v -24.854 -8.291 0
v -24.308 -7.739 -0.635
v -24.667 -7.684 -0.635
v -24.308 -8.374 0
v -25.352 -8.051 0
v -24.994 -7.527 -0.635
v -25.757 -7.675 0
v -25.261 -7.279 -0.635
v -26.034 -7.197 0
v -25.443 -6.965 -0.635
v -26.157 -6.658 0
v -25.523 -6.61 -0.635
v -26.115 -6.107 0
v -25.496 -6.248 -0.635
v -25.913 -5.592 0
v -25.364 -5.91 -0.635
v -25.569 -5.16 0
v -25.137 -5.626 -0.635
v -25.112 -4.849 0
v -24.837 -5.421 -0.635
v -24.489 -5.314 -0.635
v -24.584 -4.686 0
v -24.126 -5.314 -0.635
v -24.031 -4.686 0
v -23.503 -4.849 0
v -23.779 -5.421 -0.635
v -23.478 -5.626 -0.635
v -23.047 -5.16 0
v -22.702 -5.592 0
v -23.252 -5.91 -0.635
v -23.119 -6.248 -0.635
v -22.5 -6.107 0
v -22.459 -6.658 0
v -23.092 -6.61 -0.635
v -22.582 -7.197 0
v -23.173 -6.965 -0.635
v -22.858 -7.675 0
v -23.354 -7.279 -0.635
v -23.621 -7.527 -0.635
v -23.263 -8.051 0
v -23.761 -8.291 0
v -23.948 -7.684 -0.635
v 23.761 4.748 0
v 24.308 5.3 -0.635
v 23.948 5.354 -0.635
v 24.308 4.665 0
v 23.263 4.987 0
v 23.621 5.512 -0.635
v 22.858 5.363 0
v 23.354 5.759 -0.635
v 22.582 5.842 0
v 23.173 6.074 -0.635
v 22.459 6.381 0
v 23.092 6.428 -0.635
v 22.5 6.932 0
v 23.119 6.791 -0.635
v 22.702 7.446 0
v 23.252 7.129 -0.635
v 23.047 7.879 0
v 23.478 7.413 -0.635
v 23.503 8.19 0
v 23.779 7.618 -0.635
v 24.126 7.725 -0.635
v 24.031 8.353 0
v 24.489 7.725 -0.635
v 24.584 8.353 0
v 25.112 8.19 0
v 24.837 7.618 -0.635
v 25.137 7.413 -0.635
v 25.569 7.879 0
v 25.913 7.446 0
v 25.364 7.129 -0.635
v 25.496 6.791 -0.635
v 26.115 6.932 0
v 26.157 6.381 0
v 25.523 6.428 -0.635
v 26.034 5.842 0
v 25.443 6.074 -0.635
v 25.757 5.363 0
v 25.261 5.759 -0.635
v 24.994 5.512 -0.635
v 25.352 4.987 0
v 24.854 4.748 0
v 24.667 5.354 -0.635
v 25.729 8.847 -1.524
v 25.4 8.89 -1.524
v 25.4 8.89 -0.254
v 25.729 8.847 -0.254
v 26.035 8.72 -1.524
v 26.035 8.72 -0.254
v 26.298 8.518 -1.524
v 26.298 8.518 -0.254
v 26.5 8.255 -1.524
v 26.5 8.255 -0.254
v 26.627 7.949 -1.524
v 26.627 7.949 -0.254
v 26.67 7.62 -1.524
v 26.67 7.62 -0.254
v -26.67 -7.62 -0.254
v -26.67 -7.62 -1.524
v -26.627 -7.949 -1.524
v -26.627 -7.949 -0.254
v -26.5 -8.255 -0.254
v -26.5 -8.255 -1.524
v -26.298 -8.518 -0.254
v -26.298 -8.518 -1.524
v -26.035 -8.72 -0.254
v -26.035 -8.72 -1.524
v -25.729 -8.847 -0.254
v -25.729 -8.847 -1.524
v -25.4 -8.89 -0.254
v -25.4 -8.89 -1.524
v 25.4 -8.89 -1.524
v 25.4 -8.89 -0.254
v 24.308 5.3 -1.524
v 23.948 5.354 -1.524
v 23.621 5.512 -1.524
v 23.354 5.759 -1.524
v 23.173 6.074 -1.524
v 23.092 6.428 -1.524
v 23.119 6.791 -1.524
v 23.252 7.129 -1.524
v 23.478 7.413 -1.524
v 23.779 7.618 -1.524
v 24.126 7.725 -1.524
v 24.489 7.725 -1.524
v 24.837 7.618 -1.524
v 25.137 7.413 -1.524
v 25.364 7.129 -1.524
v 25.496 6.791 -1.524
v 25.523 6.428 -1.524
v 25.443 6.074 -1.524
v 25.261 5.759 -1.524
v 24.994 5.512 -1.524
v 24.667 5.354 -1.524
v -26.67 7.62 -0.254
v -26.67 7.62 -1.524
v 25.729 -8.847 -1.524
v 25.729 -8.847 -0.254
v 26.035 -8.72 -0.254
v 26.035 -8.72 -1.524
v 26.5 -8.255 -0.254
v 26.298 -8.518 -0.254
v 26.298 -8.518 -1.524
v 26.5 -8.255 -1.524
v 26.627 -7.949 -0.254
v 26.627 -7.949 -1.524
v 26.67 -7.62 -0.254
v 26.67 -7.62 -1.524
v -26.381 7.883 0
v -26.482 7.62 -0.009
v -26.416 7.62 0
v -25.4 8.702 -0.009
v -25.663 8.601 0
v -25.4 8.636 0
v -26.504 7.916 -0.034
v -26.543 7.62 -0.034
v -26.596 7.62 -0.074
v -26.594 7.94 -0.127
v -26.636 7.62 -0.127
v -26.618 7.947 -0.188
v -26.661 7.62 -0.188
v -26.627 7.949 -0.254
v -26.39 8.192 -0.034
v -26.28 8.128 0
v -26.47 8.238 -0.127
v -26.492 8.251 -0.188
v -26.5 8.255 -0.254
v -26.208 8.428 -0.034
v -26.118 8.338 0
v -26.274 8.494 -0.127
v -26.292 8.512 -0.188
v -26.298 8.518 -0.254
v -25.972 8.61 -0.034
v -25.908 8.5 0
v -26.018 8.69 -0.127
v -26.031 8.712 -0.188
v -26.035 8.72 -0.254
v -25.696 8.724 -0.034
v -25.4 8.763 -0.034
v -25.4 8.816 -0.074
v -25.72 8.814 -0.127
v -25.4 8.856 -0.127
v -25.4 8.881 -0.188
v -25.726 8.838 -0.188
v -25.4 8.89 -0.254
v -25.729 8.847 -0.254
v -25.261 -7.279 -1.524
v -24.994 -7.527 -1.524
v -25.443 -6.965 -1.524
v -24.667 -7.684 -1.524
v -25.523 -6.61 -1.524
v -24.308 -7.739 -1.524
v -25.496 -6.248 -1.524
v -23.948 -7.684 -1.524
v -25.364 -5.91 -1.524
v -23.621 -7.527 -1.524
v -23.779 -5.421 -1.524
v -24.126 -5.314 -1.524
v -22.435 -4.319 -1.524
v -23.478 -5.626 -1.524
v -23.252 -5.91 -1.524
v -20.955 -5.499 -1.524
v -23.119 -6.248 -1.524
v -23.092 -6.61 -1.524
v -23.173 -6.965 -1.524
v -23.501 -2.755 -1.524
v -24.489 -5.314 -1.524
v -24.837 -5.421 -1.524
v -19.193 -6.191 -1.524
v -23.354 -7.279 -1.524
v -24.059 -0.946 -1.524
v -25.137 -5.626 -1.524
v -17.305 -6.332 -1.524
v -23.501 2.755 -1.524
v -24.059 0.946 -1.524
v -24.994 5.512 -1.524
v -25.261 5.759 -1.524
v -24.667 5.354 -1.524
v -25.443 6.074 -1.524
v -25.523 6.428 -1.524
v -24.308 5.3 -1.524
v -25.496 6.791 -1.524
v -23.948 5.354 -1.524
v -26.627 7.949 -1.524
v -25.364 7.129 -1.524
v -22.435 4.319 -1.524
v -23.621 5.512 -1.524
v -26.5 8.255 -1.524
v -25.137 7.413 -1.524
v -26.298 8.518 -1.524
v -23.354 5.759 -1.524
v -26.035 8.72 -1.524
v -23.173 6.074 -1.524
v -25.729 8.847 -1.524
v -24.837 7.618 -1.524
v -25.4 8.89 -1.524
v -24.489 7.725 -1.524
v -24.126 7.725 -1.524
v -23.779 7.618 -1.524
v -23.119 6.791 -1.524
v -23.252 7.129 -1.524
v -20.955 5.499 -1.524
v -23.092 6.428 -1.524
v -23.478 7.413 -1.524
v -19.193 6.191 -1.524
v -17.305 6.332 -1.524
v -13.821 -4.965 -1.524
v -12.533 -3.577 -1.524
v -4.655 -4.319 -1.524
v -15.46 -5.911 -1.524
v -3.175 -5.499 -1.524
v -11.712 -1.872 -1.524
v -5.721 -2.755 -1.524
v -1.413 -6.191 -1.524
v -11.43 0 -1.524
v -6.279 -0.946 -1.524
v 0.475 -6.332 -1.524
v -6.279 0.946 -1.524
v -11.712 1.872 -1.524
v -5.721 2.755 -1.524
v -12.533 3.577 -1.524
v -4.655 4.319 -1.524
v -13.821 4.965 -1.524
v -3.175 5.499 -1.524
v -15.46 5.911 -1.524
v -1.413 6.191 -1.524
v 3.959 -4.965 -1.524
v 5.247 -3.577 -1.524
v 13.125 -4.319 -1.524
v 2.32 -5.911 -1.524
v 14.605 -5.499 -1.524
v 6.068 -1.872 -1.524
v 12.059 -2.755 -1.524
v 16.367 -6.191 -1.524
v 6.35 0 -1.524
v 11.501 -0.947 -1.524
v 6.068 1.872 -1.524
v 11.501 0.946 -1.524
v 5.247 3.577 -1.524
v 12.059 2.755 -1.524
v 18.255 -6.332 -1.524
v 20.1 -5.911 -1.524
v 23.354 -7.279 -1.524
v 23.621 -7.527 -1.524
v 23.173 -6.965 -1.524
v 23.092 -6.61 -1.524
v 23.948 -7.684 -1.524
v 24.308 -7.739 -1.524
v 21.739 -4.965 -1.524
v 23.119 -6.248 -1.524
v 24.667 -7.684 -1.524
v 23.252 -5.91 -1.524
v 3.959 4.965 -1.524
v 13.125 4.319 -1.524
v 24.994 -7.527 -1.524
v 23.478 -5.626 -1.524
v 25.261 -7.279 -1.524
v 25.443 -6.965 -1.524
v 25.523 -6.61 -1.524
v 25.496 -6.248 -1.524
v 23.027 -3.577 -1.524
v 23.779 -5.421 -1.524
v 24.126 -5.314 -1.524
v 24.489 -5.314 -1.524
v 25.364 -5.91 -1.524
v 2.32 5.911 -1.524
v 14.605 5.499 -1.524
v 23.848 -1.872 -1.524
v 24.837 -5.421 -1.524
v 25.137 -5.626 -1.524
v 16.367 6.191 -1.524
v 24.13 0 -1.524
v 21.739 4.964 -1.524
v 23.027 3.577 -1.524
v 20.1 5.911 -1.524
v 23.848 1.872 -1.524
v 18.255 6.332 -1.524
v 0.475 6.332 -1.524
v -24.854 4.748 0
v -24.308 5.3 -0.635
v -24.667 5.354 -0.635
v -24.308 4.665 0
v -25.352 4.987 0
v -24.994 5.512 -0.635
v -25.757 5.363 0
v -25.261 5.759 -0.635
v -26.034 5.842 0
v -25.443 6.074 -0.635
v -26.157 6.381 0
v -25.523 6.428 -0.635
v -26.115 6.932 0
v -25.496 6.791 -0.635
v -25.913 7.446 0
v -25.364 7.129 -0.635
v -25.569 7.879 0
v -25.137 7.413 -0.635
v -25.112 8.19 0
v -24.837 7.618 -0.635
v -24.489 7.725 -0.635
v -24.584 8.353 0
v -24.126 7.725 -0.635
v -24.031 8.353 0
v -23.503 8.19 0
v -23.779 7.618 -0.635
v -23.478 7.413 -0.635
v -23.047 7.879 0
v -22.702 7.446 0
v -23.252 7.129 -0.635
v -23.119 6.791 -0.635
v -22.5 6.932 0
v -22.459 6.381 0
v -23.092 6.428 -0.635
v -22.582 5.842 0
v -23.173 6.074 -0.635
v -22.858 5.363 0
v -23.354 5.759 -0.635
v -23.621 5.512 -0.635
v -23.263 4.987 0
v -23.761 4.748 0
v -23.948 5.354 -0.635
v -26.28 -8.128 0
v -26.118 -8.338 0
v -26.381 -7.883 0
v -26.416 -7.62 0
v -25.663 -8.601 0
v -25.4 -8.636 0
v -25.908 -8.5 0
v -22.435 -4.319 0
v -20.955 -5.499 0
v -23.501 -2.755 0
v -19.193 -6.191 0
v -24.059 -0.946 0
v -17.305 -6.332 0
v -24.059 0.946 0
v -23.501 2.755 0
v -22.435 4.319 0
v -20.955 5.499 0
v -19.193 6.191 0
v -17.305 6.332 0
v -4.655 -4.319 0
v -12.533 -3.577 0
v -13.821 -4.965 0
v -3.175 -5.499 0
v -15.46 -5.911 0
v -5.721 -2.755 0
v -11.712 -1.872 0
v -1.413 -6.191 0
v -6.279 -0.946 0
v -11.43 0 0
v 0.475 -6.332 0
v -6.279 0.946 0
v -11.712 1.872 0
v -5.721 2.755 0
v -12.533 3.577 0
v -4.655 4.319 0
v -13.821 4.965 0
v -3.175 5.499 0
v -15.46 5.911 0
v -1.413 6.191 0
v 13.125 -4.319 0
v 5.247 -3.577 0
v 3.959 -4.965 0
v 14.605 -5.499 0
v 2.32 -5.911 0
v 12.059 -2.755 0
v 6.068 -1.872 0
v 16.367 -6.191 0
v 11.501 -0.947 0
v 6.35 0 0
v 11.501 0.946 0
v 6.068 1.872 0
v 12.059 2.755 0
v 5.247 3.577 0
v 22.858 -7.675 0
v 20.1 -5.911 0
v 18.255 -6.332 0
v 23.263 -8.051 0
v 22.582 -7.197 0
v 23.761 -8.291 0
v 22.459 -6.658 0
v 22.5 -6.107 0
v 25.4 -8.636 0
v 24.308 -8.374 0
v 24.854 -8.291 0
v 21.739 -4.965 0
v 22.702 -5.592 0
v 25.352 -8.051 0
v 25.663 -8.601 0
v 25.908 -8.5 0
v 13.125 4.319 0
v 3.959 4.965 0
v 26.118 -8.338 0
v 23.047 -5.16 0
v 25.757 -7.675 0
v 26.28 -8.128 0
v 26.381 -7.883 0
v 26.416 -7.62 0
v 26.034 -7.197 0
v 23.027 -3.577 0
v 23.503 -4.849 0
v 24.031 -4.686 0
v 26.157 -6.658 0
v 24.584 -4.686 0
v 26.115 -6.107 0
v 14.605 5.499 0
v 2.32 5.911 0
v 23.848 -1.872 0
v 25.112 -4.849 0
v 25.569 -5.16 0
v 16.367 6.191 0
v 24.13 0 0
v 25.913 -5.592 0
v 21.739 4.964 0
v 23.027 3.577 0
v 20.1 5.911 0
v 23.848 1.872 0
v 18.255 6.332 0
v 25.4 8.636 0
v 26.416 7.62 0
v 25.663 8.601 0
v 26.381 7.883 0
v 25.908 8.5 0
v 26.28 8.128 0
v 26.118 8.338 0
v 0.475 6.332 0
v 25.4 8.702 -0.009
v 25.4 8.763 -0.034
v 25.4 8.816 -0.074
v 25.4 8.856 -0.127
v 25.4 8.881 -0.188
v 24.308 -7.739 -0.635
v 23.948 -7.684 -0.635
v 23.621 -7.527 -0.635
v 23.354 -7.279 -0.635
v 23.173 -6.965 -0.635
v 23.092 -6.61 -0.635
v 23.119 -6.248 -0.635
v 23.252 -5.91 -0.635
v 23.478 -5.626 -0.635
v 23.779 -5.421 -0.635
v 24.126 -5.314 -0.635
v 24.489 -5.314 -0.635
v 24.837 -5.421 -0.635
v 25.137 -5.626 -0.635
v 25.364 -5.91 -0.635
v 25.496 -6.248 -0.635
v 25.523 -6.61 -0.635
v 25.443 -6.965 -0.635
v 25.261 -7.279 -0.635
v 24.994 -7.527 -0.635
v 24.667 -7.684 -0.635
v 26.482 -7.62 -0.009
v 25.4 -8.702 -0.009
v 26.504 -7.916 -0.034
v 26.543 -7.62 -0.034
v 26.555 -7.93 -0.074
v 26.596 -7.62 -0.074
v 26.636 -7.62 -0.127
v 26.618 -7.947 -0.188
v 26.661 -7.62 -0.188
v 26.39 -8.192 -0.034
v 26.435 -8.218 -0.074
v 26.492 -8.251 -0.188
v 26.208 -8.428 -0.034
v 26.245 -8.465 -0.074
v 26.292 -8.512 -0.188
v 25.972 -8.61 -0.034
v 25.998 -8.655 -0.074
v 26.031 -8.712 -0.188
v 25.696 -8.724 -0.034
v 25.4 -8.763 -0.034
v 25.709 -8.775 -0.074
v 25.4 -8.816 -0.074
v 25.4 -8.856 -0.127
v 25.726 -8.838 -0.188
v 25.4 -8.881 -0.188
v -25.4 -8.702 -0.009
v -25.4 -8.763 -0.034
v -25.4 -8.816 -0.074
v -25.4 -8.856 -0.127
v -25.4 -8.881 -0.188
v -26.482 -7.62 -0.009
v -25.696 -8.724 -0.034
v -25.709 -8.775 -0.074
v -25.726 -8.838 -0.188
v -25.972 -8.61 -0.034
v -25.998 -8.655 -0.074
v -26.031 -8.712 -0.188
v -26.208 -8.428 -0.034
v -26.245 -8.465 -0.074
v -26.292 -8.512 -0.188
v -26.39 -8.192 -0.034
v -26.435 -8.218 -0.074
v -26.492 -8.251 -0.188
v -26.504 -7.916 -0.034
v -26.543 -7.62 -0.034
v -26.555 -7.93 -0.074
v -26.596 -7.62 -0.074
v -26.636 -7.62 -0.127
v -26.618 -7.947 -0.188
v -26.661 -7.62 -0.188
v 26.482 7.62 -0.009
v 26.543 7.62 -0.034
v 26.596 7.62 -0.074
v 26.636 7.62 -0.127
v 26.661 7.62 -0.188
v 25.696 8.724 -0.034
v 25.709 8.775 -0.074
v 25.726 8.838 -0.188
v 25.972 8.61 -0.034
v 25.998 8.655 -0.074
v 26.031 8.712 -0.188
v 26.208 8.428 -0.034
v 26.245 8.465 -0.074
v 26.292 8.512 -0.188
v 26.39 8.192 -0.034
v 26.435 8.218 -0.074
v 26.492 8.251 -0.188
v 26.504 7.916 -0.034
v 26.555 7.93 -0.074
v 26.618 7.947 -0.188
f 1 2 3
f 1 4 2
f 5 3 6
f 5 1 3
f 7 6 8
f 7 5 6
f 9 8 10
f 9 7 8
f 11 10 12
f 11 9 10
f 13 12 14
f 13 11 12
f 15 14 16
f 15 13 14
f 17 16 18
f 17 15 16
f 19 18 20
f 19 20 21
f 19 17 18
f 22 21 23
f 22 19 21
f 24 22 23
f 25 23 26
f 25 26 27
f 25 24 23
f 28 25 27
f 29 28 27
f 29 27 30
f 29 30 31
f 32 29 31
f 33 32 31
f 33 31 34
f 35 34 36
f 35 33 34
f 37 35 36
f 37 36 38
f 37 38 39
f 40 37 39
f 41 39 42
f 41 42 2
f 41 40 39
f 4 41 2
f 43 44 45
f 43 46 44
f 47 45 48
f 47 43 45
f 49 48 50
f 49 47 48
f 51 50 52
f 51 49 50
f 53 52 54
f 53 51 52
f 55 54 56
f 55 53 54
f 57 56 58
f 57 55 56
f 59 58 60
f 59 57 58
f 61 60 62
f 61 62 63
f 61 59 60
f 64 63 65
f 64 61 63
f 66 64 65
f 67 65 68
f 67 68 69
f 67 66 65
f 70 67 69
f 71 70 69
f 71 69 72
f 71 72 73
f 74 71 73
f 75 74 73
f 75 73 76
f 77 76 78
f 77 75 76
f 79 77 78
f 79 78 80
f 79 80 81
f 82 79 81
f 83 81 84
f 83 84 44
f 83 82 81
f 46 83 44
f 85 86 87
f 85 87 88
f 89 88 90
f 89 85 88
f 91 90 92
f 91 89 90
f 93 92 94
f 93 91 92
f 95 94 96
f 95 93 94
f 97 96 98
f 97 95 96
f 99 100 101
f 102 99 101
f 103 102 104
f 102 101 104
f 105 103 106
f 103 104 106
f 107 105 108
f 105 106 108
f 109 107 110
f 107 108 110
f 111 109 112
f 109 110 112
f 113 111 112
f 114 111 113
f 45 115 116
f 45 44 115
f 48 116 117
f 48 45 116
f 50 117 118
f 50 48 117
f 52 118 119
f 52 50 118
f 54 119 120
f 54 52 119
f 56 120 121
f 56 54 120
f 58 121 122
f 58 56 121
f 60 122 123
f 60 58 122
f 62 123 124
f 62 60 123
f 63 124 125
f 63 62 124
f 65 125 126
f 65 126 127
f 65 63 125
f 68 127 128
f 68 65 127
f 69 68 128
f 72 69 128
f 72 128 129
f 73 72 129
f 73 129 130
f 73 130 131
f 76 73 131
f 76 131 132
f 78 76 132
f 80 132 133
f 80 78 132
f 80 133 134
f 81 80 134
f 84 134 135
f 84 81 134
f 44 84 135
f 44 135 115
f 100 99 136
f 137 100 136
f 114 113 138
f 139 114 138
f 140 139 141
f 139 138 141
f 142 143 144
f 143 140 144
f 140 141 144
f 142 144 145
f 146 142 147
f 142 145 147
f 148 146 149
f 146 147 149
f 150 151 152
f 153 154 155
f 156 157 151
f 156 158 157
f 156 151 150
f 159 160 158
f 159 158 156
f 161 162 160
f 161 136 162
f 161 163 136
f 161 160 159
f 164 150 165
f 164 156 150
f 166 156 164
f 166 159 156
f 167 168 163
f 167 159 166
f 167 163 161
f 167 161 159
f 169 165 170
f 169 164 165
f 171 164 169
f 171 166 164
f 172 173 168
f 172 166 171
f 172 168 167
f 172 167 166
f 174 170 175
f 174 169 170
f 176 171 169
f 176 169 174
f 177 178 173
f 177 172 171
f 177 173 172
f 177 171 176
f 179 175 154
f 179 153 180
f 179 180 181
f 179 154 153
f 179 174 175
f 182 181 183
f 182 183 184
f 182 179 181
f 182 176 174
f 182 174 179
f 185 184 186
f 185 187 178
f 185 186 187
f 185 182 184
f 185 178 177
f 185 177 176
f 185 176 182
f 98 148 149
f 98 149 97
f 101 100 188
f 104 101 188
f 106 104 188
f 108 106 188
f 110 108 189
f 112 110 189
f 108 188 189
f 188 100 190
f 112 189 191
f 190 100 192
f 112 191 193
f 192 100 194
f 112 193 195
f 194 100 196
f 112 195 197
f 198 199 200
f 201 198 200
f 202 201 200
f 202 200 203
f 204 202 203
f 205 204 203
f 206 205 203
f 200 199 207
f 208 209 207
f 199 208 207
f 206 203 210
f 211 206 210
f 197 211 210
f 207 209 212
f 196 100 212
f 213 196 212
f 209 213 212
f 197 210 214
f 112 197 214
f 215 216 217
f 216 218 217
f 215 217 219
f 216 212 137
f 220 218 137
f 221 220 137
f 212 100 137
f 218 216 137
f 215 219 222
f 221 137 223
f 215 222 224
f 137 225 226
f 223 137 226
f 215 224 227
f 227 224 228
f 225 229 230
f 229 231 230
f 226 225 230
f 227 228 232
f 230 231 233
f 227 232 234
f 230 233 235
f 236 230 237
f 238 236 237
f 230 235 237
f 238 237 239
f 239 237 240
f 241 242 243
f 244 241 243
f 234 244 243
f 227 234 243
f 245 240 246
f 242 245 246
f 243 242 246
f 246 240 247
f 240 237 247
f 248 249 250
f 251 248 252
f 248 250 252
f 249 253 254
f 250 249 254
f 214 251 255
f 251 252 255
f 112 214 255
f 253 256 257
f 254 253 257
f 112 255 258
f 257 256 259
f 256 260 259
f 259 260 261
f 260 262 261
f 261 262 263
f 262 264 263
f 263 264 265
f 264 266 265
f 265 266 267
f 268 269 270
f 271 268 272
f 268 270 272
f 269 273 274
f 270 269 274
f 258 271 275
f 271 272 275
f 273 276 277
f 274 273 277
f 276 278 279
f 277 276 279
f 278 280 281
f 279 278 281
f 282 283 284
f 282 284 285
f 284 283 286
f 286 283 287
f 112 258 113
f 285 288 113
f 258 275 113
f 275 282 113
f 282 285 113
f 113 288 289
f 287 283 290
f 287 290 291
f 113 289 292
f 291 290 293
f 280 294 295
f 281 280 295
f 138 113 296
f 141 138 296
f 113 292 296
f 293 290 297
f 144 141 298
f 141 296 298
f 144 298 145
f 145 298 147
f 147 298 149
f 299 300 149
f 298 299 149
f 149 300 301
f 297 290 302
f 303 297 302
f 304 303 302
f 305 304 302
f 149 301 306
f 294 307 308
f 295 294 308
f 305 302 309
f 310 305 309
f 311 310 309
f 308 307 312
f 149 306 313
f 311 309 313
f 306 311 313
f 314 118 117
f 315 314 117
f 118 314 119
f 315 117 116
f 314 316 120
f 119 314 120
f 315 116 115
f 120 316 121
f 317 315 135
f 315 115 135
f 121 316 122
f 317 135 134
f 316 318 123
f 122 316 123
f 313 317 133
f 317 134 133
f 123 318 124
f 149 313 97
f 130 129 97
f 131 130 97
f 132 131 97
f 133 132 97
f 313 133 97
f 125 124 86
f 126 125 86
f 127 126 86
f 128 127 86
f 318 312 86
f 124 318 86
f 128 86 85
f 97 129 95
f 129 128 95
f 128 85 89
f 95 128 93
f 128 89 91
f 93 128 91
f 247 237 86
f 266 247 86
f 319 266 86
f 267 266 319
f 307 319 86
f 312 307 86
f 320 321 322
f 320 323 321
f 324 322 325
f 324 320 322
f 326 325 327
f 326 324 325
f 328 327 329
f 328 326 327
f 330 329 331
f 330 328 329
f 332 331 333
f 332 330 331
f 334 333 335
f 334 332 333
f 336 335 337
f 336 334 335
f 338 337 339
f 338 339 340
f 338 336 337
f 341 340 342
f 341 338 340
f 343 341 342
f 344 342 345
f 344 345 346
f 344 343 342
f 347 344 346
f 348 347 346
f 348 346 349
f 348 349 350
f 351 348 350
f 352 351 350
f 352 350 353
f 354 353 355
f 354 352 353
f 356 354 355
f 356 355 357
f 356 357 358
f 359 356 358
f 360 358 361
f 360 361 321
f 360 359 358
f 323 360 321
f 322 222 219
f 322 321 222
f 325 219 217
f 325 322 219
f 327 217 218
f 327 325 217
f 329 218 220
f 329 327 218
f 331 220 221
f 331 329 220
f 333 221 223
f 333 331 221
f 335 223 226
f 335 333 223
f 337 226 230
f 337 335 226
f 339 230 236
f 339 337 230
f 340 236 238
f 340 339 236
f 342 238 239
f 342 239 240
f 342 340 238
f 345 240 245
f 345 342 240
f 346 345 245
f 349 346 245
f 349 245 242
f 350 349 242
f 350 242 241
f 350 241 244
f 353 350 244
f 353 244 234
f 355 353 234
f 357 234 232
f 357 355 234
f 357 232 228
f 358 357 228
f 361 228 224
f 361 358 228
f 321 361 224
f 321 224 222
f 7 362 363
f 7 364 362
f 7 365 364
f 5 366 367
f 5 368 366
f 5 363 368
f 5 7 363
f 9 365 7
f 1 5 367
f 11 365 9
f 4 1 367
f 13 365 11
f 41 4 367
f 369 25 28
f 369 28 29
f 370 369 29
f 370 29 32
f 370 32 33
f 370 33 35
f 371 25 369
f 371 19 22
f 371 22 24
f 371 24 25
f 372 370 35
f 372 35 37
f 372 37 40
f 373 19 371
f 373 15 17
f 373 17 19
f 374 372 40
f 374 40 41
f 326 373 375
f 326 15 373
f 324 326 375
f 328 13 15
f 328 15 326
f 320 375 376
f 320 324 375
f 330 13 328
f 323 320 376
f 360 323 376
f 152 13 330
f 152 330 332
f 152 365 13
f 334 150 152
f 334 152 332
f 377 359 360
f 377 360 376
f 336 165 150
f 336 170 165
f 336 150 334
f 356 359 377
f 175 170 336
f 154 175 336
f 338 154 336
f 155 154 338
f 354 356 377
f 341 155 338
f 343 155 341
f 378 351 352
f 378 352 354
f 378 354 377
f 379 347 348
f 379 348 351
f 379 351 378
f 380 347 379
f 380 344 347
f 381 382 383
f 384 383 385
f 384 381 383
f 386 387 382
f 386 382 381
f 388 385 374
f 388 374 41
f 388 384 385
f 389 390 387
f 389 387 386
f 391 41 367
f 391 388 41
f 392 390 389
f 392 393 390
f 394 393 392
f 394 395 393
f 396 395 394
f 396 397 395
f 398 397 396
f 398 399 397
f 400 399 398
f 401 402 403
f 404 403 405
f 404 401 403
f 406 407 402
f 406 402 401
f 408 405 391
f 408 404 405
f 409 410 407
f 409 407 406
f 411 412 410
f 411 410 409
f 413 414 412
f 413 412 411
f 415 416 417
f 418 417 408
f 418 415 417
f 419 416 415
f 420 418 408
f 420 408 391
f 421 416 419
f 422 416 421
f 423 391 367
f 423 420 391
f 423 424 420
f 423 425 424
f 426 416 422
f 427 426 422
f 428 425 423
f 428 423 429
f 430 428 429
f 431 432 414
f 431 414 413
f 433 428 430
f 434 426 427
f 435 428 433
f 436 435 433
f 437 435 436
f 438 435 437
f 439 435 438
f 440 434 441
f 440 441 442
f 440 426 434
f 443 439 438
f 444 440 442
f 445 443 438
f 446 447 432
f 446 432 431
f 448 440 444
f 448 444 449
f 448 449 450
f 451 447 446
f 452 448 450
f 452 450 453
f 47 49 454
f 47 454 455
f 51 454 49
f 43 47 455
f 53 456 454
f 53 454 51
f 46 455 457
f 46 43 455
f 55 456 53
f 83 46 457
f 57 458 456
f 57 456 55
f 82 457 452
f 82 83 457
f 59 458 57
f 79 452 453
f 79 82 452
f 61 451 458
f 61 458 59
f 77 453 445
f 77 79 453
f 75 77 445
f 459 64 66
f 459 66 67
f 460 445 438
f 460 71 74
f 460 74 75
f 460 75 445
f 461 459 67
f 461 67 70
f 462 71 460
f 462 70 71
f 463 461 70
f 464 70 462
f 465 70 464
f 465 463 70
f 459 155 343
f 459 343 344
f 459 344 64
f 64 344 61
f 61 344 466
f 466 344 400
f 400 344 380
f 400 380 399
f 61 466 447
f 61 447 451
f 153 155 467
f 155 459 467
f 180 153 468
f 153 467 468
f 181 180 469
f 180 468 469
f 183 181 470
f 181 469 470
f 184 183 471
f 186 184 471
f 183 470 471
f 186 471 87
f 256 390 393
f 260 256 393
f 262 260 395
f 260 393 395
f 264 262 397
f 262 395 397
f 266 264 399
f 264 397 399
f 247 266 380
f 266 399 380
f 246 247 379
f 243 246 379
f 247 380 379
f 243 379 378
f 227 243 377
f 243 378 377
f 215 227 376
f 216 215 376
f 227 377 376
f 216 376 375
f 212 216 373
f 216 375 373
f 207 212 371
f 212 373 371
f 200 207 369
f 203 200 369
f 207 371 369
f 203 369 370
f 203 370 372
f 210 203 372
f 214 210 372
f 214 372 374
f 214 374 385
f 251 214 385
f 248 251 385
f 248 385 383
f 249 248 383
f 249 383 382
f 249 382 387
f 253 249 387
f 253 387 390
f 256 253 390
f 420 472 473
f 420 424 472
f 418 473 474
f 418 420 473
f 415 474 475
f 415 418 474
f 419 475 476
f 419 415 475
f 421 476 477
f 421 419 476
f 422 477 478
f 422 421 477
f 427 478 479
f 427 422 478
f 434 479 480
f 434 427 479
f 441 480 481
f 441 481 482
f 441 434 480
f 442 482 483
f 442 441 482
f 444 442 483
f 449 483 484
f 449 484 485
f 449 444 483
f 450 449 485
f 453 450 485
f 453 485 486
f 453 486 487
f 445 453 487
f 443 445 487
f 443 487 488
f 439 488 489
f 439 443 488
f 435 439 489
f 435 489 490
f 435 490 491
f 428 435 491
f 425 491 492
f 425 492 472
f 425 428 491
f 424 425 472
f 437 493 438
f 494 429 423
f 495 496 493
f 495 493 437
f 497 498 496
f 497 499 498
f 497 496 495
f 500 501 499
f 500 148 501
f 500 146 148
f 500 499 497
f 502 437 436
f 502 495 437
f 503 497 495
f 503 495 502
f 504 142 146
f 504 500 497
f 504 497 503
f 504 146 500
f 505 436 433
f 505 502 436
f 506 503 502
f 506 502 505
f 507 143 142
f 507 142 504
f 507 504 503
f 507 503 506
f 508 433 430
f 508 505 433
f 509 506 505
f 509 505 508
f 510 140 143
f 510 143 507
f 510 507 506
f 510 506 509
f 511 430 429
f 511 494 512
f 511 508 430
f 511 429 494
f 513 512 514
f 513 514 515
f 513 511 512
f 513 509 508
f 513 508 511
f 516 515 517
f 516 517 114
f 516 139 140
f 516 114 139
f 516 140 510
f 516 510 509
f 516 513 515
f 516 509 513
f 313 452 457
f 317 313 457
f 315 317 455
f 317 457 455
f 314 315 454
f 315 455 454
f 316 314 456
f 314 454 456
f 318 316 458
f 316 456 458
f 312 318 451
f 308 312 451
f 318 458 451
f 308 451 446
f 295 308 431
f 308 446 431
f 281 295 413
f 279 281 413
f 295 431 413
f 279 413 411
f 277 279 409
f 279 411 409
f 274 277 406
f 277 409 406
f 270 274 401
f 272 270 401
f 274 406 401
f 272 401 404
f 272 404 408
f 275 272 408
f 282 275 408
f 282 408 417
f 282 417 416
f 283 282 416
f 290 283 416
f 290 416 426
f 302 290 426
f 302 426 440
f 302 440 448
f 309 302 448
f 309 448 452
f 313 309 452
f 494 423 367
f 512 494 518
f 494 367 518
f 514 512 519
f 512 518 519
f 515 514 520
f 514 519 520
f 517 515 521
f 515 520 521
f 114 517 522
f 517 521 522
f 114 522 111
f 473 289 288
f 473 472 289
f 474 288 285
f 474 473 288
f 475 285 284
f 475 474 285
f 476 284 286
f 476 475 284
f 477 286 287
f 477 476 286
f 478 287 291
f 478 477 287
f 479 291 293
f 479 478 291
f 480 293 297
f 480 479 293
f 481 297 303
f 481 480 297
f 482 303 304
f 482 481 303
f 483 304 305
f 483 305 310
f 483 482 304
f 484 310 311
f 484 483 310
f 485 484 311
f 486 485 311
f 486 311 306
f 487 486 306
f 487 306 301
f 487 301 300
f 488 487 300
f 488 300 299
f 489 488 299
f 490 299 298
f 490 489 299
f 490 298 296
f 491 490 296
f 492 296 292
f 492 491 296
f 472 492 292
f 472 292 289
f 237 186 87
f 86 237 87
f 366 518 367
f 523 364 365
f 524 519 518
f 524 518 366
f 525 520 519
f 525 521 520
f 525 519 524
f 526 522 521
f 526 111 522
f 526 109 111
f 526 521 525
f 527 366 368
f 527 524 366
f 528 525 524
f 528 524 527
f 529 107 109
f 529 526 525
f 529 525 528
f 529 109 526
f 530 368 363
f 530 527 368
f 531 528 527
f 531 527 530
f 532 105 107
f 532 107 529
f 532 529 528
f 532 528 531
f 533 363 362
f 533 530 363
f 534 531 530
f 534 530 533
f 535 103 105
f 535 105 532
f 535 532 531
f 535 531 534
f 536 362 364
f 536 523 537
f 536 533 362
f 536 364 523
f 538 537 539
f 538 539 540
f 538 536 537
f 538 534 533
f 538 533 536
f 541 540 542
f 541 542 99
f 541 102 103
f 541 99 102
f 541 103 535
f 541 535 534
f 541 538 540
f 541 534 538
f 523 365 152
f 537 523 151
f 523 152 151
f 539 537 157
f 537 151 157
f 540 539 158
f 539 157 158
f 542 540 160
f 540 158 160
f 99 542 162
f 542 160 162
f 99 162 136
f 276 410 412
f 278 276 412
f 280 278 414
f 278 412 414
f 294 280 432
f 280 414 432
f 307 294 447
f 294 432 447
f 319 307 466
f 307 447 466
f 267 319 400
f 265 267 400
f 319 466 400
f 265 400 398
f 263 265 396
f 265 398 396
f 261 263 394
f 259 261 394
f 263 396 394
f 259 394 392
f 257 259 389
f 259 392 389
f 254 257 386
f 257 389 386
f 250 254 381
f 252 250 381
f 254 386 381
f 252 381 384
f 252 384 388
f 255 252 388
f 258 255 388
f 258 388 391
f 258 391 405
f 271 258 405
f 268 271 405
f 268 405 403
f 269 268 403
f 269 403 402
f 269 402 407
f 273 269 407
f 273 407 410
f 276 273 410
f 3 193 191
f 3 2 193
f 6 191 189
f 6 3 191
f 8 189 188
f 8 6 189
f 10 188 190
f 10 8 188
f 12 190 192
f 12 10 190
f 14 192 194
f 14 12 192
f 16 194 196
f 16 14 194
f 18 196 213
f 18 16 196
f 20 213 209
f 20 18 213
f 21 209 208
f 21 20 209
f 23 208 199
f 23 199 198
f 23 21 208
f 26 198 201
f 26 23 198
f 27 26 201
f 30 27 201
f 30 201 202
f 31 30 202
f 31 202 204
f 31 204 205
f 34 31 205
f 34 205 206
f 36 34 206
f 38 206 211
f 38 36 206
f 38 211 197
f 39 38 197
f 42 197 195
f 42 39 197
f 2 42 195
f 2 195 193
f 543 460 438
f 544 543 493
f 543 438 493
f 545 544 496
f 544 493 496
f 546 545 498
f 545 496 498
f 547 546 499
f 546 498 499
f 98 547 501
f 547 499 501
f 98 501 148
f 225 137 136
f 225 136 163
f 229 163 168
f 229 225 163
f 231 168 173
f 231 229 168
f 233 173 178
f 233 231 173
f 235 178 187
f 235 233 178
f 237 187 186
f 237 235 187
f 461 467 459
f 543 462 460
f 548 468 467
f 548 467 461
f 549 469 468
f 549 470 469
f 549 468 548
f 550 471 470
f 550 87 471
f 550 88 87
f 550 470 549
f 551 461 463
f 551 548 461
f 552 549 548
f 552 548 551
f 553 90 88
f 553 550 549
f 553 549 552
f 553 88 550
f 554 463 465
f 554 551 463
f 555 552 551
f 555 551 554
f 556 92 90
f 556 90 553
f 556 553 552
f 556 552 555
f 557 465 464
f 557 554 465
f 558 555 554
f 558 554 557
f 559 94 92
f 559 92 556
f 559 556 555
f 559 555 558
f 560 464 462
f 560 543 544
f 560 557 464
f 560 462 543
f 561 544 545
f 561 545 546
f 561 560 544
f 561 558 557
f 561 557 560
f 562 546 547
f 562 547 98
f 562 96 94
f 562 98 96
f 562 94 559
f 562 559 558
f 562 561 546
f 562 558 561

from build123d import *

# Parameters (mm, degrees)
SKETCH2_W                      = 53.34
SKETCH2_H                      = 17.780149528
BOSS_EXTRUDE1_DEPTH            = 1.524
F_2_CLEARANCE_HOLE1_AT_2_COUNT = 2
F_2_CLEARANCE_HOLE1_AT_2_PITCH = 13.038661485
F_2_CLEARANCE_HOLE1_AT_3_COUNT = 2
F_2_CLEARANCE_HOLE1_AT_3_PITCH = 50.333486658
F_2_CLEARANCE_HOLE1_AT_4_COUNT = 2
F_2_CLEARANCE_HOLE1_AT_4_PITCH = 48.615359567
FILLET1_R                      = 1.27
CUT_EXTRUDE1_REACH             = 30.154
SKETCH6_R                      = 6.35
FILLET2_R                      = 0.254


with BuildPart() as part:
    # Sketch2 → Boss-Extrude1 (new body)
    with BuildSketch(Plane.XY):
        Rectangle(SKETCH2_W, SKETCH2_H)
    extrude(amount=-BOSS_EXTRUDE1_DEPTH)

    # Sketch4 → #2 Clearance Hole1 (revolve, cut)
    with BuildSketch(Plane(origin=(-24.307679783, 6.519330742, 0), x_dir=(0, -1, 0), z_dir=(1, 0, 0))):
        Polygon((0, 0), (0, 1.524), (1.2192, 1.524), (1.2192, 0.635), (1.8542, 0), align=None)
    f_2_clearance_hole1 = revolve(axis=Axis((-24.307679783, 6.519330742, 6.35), (0, 0, -1)), mode=Mode.SUBTRACT)

    # #2 Clearance Hole1 at 2: #2 Clearance Hole1 ×2
    with Locations(*[(0, -i * F_2_CLEARANCE_HOLE1_AT_2_PITCH, 0) for i in range(1, F_2_CLEARANCE_HOLE1_AT_2_COUNT)]):
        add(f_2_clearance_hole1, mode=Mode.SUBTRACT)

    # #2 Clearance Hole1 at 3: #2 Clearance Hole1 ×2
    with Locations(*[Vector(0.9658651286657962, -0.25904546556040114, 0) * (i * F_2_CLEARANCE_HOLE1_AT_3_PITCH) for i in range(1, F_2_CLEARANCE_HOLE1_AT_3_COUNT)]):
        add(f_2_clearance_hole1, mode=Mode.SUBTRACT)

    # #2 Clearance Hole1 at 4: #2 Clearance Hole1 ×2
    with Locations(*[(i * F_2_CLEARANCE_HOLE1_AT_4_PITCH, 0, 0) for i in range(1, F_2_CLEARANCE_HOLE1_AT_4_COUNT)]):
        add(f_2_clearance_hole1, mode=Mode.SUBTRACT)

    # Fillet1
    fillet1_edges = [part.edges().sort_by_distance(p)[0] for p in [
        (-26.67, 8.890074764, -0.762),
        (26.67, 8.890074764, -0.762),
        (26.67, -8.890074764, -0.762),
        (-26.67, -8.890074764, -0.762),
    ]]
    fillet(fillet1_edges, radius=FILLET1_R)

    # Sketch6 → Cut-Extrude1 (cut, up to next)
    with BuildSketch(Plane.XY, mode=Mode.PRIVATE) as cut_extrude1_sk1:
        Circle(SKETCH6_R)
    cut_extrude1_tool1 = extrude(cut_extrude1_sk1.sketch, amount=-CUT_EXTRUDE1_REACH, mode=Mode.PRIVATE) & part.part
    # Sketch6 → Cut-Extrude1 (cut, up to next)
    with BuildSketch(Plane.XY, mode=Mode.PRIVATE) as cut_extrude1_sk2:
        with Locations((-17.78, 0)):
            Circle(SKETCH6_R)
    cut_extrude1_tool2 = extrude(cut_extrude1_sk2.sketch, amount=-CUT_EXTRUDE1_REACH, mode=Mode.PRIVATE) & part.part
    # Sketch6 → Cut-Extrude1 (cut, up to next)
    with BuildSketch(Plane.XY, mode=Mode.PRIVATE) as cut_extrude1_sk3:
        with Locations((17.779999999, -0.00017224)):
            Circle(SKETCH6_R)
    cut_extrude1_tool3 = extrude(cut_extrude1_sk3.sketch, amount=-CUT_EXTRUDE1_REACH, mode=Mode.PRIVATE) & part.part
    add(cut_extrude1_tool1.solids().sort_by_distance((0, 0, 0))[0], mode=Mode.SUBTRACT)
    add(cut_extrude1_tool2.solids().sort_by_distance((-17.78, 0, 0))[0], mode=Mode.SUBTRACT)
    add(cut_extrude1_tool3.solids().sort_by_distance((17.78, -0.000172, 0))[0], mode=Mode.SUBTRACT)

    # Fillet2
    fillet2_edges = [part.edges().sort_by_distance(p)[0] for p in [
        (0, 8.890074764, 0),
        (-26.67, 0, 0),
        (0, -8.890074764, 0),
        (26.67, 0, 0),
        (-26.298025612, -8.518100377, 0),
        (26.298025612, -8.518100377, 0),
        (26.298025612, 8.518100377, 0),
        (-26.298025612, 8.518100377, 0),
    ]]
    fillet(fillet2_edges, radius=FILLET2_R)


solid = part.part
